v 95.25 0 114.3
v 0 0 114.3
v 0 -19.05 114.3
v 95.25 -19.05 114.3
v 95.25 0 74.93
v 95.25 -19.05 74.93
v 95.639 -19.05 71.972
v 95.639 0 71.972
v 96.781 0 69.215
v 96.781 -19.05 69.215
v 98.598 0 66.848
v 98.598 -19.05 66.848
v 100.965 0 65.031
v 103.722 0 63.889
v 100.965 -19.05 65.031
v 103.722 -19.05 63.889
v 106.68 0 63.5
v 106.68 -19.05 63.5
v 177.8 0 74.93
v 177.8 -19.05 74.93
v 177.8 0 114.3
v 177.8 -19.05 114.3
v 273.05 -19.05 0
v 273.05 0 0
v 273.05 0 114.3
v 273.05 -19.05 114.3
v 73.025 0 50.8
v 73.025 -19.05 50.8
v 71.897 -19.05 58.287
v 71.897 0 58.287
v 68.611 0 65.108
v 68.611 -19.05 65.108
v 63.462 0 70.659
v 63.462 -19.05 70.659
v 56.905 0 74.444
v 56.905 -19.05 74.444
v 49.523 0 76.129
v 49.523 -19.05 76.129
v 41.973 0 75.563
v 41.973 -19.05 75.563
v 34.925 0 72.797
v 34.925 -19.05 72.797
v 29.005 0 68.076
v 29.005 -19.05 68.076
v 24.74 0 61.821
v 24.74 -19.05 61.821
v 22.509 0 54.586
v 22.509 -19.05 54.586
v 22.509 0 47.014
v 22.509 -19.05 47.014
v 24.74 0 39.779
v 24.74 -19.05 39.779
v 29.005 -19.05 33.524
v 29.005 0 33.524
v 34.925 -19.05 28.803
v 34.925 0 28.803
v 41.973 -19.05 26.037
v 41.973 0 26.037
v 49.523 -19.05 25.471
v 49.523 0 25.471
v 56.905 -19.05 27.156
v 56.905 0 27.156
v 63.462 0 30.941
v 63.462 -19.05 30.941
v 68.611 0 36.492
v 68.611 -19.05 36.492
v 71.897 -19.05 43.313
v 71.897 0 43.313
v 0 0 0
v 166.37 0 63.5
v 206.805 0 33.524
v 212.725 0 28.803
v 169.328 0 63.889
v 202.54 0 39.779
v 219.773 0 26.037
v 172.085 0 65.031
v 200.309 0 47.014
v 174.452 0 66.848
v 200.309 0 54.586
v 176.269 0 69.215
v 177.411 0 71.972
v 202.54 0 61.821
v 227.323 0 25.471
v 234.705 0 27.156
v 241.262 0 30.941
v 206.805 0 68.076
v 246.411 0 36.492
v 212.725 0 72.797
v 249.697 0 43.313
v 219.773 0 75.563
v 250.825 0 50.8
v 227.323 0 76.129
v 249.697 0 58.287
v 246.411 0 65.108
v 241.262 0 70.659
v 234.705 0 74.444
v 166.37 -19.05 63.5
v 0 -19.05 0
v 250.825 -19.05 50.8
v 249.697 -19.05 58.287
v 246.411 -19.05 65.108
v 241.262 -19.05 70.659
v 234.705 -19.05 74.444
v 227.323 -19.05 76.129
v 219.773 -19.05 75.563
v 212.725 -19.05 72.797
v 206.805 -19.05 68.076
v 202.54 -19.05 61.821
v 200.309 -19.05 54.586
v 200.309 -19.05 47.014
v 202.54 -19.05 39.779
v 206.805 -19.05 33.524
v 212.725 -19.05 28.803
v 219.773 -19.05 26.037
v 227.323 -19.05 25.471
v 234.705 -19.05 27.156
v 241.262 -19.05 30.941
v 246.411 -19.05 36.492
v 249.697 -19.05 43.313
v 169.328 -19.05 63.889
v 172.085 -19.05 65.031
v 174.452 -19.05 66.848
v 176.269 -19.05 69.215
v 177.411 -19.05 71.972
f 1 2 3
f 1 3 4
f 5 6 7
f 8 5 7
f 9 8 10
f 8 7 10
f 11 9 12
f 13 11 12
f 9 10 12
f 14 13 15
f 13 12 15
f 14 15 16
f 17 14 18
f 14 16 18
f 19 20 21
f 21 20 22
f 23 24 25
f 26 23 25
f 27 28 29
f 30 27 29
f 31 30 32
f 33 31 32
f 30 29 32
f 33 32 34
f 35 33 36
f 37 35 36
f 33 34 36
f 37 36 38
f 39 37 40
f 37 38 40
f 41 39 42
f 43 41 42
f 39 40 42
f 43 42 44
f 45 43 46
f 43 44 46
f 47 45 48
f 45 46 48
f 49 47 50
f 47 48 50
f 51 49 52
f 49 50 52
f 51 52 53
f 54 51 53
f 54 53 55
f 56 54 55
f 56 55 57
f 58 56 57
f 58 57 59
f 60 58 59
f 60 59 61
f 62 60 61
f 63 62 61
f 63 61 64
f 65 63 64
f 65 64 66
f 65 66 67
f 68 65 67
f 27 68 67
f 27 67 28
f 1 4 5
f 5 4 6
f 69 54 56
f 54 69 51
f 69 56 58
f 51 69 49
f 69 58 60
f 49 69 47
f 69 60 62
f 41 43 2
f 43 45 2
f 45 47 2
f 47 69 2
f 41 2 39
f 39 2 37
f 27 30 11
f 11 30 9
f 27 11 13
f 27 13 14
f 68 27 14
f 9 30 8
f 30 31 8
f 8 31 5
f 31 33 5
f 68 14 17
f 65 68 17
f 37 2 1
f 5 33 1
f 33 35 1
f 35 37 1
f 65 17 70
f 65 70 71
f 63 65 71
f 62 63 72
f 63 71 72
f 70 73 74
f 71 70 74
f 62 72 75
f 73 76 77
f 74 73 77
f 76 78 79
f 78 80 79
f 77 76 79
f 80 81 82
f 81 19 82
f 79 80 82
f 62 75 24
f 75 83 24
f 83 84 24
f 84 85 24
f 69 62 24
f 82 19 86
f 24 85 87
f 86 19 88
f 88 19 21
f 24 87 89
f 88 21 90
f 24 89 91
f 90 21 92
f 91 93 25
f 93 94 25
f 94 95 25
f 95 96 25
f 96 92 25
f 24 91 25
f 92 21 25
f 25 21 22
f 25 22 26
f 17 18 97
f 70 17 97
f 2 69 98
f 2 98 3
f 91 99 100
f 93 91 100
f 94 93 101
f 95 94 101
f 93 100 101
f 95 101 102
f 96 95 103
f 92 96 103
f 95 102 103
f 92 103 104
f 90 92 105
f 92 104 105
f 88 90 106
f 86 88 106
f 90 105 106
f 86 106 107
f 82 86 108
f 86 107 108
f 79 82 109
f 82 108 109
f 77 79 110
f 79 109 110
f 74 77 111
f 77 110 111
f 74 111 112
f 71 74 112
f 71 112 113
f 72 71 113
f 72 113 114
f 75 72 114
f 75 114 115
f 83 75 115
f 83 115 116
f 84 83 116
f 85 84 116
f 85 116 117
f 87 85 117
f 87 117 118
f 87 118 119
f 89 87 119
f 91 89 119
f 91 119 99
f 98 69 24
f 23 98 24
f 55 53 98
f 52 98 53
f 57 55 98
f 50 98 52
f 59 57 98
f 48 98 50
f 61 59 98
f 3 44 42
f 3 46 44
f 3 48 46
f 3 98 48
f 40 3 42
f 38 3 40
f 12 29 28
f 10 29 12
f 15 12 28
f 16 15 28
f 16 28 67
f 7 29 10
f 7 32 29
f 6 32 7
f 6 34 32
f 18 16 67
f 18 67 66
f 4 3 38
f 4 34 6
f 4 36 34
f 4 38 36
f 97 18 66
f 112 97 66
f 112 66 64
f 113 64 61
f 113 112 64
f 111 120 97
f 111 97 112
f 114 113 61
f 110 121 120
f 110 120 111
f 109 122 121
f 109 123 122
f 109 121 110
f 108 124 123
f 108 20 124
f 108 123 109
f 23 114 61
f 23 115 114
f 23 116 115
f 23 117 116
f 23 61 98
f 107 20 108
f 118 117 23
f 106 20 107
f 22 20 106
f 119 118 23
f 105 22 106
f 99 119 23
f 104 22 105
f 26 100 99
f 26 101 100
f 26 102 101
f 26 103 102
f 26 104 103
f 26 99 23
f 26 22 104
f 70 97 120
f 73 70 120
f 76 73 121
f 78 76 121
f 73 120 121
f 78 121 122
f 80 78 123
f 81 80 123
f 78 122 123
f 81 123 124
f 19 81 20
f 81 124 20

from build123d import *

# Parameters (mm, degrees)
F0_W     = 273.05
F0_H     = 114.3
F1_DEPTH = 19.05
F2_R     = 25.4
F3_DEPTH = 25.4
F5_DEPTH = 25.4


with BuildPart() as f1:
    # F0 (on Front) → F1 (new body)
    with BuildSketch(Plane.XZ):
        with Locations((136.525, 57.15)):
            Rectangle(F0_W, F0_H)
    extrude(amount=F1_DEPTH)

    # F2 (on face) → F3 (cut)
    with BuildSketch(Plane.XZ.offset(19.05)):
        with Locations((225.425, 50.8)):
            Circle(F2_R)
        with Locations((47.625, 50.8)):
            Circle(F2_R)
    extrude(amount=-F3_DEPTH, mode=Mode.SUBTRACT)

    # F4 (on face) → F5 (cut)
    with BuildSketch(Plane.XZ.offset(19.05)):
        with BuildLine():
            Line((177.8, 114.3), (95.25, 114.3))
            Line((95.25, 114.3), (95.25, 74.93))
            ThreePointArc((95.25, 74.93), (98.597769, 66.847769), (106.68, 63.5))
            Line((106.68, 63.5), (166.37, 63.5))
            ThreePointArc((166.37, 63.5), (174.452231, 66.847769), (177.8, 74.93))
            Line((177.8, 74.93), (177.8, 114.3))
        make_face()
    extrude(amount=-F5_DEPTH, mode=Mode.SUBTRACT)


solid = f1.part
